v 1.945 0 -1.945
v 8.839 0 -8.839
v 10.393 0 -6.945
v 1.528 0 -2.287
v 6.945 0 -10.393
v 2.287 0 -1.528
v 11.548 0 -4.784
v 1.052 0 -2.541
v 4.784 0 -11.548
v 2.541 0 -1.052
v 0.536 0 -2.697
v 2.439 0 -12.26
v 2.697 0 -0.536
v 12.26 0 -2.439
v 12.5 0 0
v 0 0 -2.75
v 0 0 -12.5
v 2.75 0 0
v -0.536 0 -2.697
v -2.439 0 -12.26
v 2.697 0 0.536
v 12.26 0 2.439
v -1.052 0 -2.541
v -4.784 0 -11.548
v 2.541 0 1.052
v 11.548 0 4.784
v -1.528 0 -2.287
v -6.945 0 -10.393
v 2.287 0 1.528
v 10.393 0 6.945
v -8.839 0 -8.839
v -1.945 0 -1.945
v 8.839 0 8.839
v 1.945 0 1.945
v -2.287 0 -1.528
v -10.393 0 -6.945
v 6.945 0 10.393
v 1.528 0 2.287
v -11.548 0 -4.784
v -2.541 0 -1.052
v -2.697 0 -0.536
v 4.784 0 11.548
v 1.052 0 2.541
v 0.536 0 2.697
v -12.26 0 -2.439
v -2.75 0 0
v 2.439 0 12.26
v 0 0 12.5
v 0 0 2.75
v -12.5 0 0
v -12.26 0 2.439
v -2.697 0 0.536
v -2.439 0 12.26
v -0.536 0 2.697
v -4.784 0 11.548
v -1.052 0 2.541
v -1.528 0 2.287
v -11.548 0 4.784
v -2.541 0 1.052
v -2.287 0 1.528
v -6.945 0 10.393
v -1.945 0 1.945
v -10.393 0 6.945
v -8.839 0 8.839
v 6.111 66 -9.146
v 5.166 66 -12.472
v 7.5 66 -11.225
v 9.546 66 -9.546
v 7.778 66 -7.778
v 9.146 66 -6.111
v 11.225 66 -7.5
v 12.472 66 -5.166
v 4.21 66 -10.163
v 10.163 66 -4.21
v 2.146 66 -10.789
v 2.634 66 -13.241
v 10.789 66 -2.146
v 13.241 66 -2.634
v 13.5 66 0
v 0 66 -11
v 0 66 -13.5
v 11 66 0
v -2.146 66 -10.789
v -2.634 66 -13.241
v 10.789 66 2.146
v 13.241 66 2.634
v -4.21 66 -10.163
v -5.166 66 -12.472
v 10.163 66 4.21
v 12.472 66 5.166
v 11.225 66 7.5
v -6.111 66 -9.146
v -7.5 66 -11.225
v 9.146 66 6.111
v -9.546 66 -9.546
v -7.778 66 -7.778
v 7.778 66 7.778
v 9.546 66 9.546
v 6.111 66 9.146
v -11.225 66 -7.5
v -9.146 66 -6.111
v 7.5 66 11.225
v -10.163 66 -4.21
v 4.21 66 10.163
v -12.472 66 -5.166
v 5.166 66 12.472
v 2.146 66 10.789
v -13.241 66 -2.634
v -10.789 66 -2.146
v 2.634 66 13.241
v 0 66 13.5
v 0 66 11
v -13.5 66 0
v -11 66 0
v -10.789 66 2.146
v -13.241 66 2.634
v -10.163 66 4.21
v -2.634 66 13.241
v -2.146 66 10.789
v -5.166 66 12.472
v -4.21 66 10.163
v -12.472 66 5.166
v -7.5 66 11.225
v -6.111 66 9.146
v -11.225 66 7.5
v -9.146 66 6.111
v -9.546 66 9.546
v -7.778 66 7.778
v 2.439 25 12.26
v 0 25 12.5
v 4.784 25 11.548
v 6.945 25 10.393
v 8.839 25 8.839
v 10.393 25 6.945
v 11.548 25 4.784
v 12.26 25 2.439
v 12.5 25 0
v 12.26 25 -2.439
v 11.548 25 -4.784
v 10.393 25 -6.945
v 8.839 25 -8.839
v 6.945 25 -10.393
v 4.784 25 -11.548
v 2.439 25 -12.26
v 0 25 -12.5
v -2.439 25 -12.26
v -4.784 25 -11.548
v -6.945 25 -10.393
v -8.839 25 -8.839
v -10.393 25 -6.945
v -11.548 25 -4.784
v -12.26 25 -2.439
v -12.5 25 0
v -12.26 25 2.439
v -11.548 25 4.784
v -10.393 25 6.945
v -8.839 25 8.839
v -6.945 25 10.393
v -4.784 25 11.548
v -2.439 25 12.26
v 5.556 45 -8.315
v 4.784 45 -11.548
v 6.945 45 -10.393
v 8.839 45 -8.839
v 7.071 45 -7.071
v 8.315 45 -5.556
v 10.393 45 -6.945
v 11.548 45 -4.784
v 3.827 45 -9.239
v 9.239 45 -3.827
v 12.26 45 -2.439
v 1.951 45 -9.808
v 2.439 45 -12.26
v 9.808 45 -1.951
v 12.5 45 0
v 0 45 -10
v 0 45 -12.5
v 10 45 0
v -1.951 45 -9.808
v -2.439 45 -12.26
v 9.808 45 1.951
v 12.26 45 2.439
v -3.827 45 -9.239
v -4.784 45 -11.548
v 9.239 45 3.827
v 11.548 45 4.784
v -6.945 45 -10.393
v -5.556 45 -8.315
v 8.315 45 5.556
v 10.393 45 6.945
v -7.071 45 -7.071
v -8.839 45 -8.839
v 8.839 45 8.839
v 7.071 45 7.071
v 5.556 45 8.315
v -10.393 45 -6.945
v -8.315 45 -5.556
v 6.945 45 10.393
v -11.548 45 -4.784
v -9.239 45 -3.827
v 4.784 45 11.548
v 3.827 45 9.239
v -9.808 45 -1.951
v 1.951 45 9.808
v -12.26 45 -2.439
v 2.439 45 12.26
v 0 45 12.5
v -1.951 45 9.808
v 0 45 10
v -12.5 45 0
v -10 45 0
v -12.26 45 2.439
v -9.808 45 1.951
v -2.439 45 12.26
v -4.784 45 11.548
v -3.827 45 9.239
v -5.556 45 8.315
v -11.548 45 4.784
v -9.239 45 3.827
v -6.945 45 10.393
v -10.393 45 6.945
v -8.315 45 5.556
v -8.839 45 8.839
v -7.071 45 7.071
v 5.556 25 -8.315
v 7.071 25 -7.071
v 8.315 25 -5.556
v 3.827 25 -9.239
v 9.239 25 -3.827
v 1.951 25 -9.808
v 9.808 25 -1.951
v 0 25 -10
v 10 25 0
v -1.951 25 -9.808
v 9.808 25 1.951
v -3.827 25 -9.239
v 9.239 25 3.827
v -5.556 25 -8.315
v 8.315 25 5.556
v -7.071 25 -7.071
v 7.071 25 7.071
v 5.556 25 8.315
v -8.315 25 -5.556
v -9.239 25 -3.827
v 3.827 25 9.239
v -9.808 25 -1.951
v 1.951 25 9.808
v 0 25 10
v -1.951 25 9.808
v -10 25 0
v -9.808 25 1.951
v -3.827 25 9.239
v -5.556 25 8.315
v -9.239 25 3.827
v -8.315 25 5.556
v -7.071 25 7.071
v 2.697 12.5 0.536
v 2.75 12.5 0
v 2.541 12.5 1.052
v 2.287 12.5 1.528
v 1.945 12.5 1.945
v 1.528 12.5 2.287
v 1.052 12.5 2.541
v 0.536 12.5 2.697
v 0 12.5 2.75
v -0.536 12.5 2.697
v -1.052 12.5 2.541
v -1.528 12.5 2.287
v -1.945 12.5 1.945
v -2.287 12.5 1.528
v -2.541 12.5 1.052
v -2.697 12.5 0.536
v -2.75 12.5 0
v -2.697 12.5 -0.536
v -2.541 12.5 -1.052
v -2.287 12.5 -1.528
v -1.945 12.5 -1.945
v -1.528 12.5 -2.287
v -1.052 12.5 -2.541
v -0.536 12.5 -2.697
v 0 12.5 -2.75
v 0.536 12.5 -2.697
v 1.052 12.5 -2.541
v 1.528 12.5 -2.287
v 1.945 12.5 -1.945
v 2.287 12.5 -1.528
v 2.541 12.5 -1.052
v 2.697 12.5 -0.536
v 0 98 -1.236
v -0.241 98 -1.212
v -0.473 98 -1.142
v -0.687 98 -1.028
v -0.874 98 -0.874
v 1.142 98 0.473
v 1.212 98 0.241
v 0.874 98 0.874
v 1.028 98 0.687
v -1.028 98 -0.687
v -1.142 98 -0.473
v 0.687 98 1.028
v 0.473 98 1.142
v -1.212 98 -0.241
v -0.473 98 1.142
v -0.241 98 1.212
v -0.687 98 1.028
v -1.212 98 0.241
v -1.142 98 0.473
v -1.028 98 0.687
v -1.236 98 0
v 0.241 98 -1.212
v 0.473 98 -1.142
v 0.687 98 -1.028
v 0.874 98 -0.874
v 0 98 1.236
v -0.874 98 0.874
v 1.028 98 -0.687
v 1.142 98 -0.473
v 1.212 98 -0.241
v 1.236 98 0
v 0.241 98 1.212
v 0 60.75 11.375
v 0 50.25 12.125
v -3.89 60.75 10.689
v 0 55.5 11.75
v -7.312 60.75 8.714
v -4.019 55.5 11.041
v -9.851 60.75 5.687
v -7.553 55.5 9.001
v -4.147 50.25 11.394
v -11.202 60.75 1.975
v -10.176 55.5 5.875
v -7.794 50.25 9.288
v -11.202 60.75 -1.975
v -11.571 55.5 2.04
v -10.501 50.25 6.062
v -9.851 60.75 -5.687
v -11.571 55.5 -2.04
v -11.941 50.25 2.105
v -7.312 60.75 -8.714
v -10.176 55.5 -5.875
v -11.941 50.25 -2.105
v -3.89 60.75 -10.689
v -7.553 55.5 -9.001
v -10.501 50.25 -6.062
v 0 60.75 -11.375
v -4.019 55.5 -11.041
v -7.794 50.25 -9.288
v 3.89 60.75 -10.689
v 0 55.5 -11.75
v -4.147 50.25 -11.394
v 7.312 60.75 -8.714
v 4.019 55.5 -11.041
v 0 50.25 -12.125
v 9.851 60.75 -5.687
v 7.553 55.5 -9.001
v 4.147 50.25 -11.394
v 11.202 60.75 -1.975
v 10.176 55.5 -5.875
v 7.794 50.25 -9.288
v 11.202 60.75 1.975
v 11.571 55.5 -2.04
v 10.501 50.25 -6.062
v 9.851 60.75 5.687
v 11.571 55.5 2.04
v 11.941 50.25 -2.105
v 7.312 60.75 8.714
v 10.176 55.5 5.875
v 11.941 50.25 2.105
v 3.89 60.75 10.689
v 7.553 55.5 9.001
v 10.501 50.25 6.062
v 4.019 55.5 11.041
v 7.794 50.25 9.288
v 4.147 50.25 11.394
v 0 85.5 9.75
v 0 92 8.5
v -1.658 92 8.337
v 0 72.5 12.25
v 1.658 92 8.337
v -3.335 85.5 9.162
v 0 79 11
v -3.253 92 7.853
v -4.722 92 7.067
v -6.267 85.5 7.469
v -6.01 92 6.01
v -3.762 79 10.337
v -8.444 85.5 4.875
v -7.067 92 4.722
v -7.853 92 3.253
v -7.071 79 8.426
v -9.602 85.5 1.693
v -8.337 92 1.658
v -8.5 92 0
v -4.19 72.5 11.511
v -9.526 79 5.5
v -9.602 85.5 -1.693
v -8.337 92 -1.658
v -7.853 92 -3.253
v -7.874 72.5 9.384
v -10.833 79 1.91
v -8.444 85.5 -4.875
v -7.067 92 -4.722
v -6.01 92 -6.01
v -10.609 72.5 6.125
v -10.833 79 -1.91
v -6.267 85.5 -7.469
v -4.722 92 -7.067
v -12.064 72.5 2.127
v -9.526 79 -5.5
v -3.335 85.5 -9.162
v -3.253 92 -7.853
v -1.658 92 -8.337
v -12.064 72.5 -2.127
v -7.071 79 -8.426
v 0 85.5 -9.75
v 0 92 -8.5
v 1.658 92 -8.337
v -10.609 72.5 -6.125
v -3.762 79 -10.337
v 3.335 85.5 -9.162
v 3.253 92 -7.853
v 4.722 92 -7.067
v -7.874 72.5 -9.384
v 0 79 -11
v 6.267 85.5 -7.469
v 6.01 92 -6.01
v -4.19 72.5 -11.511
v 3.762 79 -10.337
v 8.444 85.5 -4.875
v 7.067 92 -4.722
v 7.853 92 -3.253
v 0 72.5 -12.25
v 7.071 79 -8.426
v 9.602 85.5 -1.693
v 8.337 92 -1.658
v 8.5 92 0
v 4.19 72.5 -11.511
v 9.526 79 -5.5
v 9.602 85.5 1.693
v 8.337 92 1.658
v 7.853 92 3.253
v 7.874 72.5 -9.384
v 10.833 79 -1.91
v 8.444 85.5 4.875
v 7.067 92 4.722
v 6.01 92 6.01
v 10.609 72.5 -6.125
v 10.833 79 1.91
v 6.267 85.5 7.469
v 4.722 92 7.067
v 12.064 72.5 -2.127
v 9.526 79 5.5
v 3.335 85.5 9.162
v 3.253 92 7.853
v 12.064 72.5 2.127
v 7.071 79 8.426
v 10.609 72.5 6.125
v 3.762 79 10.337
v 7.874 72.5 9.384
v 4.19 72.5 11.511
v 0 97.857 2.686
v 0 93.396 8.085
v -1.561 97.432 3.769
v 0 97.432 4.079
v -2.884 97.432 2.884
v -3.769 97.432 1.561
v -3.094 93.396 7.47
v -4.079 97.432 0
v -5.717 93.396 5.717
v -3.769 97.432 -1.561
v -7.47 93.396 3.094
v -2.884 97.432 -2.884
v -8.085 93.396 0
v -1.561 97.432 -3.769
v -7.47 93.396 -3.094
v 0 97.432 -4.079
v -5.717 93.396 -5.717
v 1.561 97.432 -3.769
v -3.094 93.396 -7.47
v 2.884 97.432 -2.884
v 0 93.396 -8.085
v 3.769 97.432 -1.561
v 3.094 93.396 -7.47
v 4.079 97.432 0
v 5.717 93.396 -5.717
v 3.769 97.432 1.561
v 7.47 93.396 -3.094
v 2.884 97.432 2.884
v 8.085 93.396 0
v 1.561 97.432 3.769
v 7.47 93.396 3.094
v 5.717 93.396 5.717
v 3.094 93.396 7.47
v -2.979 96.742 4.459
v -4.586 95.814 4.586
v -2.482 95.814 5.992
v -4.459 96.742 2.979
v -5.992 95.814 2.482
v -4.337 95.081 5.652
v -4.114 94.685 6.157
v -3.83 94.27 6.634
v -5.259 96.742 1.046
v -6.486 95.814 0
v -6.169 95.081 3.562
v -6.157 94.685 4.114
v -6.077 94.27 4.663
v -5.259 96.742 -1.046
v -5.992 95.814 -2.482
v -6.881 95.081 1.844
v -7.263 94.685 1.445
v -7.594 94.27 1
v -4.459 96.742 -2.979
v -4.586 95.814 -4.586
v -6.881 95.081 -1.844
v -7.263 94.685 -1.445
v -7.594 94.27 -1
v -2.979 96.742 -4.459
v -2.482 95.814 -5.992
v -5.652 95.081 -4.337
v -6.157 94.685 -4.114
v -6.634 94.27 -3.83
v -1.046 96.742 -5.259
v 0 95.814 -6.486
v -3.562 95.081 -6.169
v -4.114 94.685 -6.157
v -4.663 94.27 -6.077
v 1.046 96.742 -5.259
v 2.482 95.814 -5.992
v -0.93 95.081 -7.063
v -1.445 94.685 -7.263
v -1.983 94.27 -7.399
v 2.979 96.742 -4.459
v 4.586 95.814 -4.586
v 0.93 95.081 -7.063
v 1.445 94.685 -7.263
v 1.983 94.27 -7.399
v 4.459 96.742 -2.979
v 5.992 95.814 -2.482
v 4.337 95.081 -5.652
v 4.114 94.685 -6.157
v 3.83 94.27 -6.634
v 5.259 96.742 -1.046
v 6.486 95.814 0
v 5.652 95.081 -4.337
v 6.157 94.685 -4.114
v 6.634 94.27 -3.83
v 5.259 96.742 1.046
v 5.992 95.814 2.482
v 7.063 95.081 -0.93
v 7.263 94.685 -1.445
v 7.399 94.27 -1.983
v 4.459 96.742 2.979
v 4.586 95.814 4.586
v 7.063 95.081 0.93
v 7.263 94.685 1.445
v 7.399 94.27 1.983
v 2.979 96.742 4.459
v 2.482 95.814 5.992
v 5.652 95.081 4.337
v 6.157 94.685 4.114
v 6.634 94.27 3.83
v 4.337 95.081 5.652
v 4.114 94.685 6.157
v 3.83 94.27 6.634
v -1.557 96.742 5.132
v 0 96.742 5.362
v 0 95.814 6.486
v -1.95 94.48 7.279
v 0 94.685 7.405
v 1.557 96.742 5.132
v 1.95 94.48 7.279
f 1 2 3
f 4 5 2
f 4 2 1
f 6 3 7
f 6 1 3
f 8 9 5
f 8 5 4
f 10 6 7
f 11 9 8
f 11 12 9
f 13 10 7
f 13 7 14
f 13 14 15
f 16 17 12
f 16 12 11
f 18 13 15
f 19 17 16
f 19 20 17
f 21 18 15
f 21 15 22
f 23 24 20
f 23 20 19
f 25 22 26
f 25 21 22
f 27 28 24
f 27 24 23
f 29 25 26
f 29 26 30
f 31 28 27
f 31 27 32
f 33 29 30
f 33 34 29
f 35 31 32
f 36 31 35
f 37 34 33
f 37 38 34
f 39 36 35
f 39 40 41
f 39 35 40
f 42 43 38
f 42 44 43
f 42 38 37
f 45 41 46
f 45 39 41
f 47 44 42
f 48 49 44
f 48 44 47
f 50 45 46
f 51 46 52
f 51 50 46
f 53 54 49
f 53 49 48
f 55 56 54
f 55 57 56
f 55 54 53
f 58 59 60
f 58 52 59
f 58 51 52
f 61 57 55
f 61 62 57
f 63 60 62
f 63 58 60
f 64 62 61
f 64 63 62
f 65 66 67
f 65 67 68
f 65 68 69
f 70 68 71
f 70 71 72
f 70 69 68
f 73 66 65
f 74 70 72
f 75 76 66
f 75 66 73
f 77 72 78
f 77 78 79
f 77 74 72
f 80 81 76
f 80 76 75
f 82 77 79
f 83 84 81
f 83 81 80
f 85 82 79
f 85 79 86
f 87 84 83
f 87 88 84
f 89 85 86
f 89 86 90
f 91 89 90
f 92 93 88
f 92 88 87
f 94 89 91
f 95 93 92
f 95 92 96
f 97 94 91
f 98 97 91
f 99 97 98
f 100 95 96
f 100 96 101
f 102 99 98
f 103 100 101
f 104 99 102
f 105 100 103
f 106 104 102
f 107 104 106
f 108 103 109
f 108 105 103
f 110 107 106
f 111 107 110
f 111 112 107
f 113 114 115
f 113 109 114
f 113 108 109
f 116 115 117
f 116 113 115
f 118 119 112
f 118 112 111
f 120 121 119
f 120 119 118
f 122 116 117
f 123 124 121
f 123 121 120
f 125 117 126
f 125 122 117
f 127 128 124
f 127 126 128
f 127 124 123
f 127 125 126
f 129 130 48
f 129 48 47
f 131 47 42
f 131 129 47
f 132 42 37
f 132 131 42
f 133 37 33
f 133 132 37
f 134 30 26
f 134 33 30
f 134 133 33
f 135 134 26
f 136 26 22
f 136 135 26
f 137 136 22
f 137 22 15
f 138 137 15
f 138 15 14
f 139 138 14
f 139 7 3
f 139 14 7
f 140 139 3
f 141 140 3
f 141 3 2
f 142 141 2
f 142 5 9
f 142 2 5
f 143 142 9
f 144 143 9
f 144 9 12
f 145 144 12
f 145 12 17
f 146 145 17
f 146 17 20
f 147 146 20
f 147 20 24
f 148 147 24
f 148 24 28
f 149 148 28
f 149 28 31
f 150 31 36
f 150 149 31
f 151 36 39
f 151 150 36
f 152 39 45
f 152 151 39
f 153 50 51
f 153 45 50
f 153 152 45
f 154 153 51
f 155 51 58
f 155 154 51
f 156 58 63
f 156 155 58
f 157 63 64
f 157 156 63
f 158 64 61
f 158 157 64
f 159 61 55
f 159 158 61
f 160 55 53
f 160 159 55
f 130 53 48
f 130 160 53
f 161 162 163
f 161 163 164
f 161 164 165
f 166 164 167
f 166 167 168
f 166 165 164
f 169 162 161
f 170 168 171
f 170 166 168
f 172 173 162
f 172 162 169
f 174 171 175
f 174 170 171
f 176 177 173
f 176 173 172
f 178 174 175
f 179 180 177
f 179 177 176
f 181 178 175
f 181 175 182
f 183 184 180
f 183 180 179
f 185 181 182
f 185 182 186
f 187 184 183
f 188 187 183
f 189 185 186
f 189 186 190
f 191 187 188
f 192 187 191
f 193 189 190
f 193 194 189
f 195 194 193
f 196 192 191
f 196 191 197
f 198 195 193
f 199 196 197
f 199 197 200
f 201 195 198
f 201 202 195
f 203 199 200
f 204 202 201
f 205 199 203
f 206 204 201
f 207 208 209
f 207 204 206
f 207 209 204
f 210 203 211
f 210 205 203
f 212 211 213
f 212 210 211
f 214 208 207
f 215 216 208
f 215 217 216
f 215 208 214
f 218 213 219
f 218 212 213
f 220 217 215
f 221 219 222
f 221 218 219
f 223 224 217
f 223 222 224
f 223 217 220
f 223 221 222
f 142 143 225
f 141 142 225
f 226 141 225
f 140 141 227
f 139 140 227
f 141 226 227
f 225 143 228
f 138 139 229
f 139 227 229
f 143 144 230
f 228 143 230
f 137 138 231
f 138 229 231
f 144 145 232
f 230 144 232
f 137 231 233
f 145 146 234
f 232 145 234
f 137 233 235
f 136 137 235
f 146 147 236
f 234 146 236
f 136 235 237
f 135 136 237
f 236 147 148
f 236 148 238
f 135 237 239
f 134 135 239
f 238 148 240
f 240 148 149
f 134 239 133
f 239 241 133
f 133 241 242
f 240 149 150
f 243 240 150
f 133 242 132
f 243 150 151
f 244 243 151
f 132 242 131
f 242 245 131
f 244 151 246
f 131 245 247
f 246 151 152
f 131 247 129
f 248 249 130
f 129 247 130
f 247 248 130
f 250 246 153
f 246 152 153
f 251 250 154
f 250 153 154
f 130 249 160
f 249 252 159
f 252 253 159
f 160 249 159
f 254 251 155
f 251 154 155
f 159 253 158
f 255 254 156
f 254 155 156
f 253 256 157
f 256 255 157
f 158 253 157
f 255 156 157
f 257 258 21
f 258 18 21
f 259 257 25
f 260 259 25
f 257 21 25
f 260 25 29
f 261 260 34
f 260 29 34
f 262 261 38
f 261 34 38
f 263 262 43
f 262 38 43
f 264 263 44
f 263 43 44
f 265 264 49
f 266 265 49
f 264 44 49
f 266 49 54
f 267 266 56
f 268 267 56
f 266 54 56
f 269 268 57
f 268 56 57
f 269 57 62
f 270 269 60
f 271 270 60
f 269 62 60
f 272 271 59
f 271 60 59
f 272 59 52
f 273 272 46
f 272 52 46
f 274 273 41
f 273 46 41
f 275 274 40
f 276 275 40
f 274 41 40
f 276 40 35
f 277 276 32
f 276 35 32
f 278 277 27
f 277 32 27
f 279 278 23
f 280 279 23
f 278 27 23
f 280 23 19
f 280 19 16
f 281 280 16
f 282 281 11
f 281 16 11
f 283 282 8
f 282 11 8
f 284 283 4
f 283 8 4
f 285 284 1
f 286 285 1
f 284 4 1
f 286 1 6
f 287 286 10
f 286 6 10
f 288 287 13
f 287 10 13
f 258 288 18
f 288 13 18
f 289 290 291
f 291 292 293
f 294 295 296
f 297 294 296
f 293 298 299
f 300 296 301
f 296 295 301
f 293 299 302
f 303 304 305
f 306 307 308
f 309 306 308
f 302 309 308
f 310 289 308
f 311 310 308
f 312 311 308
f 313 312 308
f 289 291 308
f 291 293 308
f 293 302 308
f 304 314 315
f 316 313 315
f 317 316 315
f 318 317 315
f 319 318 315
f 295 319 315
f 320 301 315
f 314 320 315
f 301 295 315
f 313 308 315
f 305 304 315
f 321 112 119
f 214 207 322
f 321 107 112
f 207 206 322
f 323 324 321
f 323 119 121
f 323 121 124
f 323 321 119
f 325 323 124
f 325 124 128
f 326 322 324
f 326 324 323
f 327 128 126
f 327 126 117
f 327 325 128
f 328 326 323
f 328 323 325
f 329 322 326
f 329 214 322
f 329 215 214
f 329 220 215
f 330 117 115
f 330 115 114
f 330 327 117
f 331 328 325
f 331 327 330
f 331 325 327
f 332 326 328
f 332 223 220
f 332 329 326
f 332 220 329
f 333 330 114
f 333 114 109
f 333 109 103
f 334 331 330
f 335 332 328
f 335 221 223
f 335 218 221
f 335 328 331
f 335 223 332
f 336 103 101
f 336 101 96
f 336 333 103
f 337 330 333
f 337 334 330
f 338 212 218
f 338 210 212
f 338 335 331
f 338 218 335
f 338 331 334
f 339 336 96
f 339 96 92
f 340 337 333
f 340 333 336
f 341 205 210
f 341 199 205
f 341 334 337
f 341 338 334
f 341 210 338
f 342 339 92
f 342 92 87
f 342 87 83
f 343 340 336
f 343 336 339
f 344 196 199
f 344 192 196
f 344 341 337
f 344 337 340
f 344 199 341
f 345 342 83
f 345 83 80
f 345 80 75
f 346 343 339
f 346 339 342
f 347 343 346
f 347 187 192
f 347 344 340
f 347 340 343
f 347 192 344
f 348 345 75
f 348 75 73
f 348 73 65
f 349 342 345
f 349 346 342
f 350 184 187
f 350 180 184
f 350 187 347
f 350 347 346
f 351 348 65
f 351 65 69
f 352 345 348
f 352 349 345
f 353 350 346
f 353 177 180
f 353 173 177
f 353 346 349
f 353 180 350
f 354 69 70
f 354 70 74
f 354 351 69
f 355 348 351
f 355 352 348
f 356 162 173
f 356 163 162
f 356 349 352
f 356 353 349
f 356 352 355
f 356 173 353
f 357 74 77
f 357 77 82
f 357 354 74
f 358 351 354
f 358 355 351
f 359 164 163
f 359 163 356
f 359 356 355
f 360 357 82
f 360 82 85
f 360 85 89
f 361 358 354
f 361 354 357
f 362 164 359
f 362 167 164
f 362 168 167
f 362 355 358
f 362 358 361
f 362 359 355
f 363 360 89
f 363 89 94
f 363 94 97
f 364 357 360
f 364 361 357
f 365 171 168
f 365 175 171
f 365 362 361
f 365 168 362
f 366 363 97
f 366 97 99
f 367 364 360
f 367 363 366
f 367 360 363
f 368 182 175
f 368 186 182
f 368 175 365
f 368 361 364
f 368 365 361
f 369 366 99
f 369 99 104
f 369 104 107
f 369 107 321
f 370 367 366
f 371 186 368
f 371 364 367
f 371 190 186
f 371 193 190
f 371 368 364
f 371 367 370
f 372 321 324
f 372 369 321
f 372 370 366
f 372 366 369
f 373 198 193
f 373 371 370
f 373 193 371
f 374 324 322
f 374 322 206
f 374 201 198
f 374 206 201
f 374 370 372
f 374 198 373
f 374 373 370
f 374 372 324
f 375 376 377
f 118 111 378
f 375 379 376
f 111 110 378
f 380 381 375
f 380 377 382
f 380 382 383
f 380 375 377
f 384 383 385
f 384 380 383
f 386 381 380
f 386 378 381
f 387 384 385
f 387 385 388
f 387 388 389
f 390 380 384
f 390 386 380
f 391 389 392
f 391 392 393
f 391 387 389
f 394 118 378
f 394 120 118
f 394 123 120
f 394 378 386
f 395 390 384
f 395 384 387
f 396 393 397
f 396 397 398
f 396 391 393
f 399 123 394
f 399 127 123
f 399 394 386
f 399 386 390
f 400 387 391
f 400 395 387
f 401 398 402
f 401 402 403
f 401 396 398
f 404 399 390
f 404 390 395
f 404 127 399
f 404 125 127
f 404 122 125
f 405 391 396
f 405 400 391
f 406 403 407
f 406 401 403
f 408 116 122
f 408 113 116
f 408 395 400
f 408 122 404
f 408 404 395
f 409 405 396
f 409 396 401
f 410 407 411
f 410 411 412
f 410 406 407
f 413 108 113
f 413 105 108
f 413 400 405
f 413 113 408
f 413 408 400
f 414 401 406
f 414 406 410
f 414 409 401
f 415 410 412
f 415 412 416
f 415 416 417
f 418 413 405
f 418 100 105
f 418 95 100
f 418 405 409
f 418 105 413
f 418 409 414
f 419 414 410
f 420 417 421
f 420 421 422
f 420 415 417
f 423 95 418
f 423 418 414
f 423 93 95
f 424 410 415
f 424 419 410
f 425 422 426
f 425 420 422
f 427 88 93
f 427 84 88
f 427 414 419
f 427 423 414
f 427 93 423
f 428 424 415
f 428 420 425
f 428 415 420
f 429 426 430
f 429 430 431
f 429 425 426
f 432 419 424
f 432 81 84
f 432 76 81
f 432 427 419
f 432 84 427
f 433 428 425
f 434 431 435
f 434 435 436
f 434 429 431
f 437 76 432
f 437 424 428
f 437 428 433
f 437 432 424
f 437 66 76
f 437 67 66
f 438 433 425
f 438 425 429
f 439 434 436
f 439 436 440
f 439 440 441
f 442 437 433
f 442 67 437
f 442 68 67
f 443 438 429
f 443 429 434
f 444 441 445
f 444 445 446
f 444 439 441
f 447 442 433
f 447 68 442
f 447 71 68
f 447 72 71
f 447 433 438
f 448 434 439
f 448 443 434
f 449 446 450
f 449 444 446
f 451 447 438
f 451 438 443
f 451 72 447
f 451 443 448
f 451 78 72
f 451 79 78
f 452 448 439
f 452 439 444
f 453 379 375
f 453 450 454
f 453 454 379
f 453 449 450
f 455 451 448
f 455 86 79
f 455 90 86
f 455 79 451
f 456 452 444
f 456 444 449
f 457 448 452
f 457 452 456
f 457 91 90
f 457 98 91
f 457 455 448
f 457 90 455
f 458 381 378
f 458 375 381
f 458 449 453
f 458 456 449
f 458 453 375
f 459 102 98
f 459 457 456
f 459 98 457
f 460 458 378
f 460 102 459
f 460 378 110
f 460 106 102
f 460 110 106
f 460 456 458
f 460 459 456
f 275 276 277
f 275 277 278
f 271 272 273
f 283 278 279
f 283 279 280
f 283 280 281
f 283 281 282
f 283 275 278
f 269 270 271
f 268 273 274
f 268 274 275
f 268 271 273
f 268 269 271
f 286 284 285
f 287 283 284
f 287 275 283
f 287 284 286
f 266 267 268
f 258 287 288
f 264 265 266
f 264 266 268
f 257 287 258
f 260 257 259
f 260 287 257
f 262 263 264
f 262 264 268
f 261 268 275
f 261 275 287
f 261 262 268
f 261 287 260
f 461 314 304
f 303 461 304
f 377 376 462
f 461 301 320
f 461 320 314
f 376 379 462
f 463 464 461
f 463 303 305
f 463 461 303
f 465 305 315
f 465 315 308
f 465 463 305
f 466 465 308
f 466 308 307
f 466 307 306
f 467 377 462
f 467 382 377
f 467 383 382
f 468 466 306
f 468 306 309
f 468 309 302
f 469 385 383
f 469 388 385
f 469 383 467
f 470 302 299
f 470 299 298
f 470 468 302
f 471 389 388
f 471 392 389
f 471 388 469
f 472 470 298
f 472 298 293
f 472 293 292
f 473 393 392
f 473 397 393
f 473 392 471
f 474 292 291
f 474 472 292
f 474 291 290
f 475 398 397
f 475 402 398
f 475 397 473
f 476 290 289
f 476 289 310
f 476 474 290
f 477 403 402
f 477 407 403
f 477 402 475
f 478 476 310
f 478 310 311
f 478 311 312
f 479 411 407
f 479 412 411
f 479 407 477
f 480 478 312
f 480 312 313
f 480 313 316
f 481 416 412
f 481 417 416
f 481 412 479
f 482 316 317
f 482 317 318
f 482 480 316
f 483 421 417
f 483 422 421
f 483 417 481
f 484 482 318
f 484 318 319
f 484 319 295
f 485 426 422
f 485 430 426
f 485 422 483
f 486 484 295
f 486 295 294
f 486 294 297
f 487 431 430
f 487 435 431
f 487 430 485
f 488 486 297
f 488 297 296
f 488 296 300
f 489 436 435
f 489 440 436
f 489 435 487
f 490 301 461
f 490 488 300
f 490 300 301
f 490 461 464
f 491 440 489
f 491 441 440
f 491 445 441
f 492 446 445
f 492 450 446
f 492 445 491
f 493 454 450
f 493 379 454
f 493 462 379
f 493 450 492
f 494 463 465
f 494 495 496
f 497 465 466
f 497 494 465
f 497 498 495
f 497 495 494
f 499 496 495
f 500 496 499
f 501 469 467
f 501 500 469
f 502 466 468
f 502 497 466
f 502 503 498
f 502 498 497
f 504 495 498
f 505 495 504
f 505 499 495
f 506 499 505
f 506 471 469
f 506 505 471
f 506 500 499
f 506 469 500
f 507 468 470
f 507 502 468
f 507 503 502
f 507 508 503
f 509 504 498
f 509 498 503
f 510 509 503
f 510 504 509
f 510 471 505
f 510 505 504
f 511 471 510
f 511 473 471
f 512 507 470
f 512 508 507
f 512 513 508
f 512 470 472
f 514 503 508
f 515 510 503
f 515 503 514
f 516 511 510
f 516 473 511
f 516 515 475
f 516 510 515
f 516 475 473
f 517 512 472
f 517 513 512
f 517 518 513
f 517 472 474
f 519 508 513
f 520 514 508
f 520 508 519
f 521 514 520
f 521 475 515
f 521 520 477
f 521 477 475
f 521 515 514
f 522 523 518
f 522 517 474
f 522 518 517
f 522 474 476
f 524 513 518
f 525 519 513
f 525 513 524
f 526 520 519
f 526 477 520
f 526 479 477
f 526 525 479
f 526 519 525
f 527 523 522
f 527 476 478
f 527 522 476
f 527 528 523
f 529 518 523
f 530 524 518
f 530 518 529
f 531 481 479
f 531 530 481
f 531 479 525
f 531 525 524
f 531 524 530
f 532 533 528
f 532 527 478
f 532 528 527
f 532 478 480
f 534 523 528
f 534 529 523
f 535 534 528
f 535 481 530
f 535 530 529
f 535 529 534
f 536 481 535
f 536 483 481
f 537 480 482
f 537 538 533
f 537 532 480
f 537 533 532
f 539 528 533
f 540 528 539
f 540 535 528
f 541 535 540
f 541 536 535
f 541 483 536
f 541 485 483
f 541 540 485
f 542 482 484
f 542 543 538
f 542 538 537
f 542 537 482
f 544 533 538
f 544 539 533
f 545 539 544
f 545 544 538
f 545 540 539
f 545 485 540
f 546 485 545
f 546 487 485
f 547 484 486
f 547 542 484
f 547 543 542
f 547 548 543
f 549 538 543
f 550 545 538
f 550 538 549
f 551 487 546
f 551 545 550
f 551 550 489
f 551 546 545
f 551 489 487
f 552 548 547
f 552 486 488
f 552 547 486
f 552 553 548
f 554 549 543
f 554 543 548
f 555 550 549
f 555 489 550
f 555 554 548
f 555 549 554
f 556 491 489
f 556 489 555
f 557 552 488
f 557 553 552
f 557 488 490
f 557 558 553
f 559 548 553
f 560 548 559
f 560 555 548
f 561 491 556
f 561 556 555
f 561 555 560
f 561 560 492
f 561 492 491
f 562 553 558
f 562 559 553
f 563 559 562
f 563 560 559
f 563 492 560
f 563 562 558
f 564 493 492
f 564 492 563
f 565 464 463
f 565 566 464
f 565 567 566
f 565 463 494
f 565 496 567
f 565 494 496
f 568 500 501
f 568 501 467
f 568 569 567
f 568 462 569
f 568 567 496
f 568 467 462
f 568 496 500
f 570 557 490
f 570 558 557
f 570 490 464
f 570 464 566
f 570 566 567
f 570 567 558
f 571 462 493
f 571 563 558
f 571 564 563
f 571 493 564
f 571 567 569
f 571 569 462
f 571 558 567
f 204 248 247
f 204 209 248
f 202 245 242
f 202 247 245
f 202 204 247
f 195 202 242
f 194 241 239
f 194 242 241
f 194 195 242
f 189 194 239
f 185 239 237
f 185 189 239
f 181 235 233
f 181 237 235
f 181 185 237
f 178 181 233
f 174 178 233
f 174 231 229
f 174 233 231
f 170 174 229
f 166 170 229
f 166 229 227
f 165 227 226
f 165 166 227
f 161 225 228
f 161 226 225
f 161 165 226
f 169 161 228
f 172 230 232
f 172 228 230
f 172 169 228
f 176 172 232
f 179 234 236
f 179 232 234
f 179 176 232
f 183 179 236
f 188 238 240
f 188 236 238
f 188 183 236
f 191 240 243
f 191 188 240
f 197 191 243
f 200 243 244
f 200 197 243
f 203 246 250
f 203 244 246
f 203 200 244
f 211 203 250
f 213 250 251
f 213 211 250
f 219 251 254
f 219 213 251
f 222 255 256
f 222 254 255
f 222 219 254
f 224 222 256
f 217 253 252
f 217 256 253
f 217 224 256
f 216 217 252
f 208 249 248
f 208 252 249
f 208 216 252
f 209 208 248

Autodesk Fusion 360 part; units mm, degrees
sketch "Sketch1" plane through (0, 0, 0) normal (1, 0, 0) x (0, 1, 0)
  line L0 (0, 0) -> (0, 12.5)
  line L1 (0, 12.5) -> (25, 12.5)
  line L2 (25, 12.5) -> (25, 10)
  line L3 (25, 10) -> (45, 10)
  line L4 (45, 10) -> (45, 12.5)
  line L5 (45, 12.5) -> (66, 12.5) construction
  line L6 (66, 12.5) -> (66, 11)
  line L7 (45, 12.5) -> (66, 11)
  line L8 (66, 12.5) -> (66, 13.5)
  line L9 (66, 13.5) -> (92, 13.5) construction
  line L10 (92, 13.5) -> (92, 8.5) construction
  line L11 (66, 13.5) -> (92, 8.5)
  line L12 (66, 13.5) -> (98, 13.5) construction
  line L13 (98, 13.5) -> (98, 0)
  arc A0 (98, 1.2362) -> (92, 8.5) centre (90.6031, 1.2362) ccw
  line L14 (98, 0) -> (0, 0)
  dimension "d1" = 12.5
  dimension "d2" = 25
  dimension "d4" = 20
  dimension "d6" = 21
  dimension "d9" = 26
  dimension "d10" = 5
  dimension "d11" = 13.5
  dimension "d12" = 12.5
  dimension "d13" = 10
  dimension "d14" = 11
  dimension "d15" = 32
  dimension "d16" = 7.3969
revolve "Revolve1" add sketch "Sketch1" angle 360 about axis through (0, 98, 0) along (0, -1, 0)
sketch "Sketch3" plane through (0, 0, 0) normal (0, -1, 0) x (1, 0, 0)
  circle A0 centre (0, 0) radius 12.5
  circle A1 centre (0, 0) radius 2.75
  dimension "d26" = 5.5
extrude "Extrude2" cut sketch "Sketch3" against normal blind 12.5 contours A1
equation "d1 = 25 mm / 2"
